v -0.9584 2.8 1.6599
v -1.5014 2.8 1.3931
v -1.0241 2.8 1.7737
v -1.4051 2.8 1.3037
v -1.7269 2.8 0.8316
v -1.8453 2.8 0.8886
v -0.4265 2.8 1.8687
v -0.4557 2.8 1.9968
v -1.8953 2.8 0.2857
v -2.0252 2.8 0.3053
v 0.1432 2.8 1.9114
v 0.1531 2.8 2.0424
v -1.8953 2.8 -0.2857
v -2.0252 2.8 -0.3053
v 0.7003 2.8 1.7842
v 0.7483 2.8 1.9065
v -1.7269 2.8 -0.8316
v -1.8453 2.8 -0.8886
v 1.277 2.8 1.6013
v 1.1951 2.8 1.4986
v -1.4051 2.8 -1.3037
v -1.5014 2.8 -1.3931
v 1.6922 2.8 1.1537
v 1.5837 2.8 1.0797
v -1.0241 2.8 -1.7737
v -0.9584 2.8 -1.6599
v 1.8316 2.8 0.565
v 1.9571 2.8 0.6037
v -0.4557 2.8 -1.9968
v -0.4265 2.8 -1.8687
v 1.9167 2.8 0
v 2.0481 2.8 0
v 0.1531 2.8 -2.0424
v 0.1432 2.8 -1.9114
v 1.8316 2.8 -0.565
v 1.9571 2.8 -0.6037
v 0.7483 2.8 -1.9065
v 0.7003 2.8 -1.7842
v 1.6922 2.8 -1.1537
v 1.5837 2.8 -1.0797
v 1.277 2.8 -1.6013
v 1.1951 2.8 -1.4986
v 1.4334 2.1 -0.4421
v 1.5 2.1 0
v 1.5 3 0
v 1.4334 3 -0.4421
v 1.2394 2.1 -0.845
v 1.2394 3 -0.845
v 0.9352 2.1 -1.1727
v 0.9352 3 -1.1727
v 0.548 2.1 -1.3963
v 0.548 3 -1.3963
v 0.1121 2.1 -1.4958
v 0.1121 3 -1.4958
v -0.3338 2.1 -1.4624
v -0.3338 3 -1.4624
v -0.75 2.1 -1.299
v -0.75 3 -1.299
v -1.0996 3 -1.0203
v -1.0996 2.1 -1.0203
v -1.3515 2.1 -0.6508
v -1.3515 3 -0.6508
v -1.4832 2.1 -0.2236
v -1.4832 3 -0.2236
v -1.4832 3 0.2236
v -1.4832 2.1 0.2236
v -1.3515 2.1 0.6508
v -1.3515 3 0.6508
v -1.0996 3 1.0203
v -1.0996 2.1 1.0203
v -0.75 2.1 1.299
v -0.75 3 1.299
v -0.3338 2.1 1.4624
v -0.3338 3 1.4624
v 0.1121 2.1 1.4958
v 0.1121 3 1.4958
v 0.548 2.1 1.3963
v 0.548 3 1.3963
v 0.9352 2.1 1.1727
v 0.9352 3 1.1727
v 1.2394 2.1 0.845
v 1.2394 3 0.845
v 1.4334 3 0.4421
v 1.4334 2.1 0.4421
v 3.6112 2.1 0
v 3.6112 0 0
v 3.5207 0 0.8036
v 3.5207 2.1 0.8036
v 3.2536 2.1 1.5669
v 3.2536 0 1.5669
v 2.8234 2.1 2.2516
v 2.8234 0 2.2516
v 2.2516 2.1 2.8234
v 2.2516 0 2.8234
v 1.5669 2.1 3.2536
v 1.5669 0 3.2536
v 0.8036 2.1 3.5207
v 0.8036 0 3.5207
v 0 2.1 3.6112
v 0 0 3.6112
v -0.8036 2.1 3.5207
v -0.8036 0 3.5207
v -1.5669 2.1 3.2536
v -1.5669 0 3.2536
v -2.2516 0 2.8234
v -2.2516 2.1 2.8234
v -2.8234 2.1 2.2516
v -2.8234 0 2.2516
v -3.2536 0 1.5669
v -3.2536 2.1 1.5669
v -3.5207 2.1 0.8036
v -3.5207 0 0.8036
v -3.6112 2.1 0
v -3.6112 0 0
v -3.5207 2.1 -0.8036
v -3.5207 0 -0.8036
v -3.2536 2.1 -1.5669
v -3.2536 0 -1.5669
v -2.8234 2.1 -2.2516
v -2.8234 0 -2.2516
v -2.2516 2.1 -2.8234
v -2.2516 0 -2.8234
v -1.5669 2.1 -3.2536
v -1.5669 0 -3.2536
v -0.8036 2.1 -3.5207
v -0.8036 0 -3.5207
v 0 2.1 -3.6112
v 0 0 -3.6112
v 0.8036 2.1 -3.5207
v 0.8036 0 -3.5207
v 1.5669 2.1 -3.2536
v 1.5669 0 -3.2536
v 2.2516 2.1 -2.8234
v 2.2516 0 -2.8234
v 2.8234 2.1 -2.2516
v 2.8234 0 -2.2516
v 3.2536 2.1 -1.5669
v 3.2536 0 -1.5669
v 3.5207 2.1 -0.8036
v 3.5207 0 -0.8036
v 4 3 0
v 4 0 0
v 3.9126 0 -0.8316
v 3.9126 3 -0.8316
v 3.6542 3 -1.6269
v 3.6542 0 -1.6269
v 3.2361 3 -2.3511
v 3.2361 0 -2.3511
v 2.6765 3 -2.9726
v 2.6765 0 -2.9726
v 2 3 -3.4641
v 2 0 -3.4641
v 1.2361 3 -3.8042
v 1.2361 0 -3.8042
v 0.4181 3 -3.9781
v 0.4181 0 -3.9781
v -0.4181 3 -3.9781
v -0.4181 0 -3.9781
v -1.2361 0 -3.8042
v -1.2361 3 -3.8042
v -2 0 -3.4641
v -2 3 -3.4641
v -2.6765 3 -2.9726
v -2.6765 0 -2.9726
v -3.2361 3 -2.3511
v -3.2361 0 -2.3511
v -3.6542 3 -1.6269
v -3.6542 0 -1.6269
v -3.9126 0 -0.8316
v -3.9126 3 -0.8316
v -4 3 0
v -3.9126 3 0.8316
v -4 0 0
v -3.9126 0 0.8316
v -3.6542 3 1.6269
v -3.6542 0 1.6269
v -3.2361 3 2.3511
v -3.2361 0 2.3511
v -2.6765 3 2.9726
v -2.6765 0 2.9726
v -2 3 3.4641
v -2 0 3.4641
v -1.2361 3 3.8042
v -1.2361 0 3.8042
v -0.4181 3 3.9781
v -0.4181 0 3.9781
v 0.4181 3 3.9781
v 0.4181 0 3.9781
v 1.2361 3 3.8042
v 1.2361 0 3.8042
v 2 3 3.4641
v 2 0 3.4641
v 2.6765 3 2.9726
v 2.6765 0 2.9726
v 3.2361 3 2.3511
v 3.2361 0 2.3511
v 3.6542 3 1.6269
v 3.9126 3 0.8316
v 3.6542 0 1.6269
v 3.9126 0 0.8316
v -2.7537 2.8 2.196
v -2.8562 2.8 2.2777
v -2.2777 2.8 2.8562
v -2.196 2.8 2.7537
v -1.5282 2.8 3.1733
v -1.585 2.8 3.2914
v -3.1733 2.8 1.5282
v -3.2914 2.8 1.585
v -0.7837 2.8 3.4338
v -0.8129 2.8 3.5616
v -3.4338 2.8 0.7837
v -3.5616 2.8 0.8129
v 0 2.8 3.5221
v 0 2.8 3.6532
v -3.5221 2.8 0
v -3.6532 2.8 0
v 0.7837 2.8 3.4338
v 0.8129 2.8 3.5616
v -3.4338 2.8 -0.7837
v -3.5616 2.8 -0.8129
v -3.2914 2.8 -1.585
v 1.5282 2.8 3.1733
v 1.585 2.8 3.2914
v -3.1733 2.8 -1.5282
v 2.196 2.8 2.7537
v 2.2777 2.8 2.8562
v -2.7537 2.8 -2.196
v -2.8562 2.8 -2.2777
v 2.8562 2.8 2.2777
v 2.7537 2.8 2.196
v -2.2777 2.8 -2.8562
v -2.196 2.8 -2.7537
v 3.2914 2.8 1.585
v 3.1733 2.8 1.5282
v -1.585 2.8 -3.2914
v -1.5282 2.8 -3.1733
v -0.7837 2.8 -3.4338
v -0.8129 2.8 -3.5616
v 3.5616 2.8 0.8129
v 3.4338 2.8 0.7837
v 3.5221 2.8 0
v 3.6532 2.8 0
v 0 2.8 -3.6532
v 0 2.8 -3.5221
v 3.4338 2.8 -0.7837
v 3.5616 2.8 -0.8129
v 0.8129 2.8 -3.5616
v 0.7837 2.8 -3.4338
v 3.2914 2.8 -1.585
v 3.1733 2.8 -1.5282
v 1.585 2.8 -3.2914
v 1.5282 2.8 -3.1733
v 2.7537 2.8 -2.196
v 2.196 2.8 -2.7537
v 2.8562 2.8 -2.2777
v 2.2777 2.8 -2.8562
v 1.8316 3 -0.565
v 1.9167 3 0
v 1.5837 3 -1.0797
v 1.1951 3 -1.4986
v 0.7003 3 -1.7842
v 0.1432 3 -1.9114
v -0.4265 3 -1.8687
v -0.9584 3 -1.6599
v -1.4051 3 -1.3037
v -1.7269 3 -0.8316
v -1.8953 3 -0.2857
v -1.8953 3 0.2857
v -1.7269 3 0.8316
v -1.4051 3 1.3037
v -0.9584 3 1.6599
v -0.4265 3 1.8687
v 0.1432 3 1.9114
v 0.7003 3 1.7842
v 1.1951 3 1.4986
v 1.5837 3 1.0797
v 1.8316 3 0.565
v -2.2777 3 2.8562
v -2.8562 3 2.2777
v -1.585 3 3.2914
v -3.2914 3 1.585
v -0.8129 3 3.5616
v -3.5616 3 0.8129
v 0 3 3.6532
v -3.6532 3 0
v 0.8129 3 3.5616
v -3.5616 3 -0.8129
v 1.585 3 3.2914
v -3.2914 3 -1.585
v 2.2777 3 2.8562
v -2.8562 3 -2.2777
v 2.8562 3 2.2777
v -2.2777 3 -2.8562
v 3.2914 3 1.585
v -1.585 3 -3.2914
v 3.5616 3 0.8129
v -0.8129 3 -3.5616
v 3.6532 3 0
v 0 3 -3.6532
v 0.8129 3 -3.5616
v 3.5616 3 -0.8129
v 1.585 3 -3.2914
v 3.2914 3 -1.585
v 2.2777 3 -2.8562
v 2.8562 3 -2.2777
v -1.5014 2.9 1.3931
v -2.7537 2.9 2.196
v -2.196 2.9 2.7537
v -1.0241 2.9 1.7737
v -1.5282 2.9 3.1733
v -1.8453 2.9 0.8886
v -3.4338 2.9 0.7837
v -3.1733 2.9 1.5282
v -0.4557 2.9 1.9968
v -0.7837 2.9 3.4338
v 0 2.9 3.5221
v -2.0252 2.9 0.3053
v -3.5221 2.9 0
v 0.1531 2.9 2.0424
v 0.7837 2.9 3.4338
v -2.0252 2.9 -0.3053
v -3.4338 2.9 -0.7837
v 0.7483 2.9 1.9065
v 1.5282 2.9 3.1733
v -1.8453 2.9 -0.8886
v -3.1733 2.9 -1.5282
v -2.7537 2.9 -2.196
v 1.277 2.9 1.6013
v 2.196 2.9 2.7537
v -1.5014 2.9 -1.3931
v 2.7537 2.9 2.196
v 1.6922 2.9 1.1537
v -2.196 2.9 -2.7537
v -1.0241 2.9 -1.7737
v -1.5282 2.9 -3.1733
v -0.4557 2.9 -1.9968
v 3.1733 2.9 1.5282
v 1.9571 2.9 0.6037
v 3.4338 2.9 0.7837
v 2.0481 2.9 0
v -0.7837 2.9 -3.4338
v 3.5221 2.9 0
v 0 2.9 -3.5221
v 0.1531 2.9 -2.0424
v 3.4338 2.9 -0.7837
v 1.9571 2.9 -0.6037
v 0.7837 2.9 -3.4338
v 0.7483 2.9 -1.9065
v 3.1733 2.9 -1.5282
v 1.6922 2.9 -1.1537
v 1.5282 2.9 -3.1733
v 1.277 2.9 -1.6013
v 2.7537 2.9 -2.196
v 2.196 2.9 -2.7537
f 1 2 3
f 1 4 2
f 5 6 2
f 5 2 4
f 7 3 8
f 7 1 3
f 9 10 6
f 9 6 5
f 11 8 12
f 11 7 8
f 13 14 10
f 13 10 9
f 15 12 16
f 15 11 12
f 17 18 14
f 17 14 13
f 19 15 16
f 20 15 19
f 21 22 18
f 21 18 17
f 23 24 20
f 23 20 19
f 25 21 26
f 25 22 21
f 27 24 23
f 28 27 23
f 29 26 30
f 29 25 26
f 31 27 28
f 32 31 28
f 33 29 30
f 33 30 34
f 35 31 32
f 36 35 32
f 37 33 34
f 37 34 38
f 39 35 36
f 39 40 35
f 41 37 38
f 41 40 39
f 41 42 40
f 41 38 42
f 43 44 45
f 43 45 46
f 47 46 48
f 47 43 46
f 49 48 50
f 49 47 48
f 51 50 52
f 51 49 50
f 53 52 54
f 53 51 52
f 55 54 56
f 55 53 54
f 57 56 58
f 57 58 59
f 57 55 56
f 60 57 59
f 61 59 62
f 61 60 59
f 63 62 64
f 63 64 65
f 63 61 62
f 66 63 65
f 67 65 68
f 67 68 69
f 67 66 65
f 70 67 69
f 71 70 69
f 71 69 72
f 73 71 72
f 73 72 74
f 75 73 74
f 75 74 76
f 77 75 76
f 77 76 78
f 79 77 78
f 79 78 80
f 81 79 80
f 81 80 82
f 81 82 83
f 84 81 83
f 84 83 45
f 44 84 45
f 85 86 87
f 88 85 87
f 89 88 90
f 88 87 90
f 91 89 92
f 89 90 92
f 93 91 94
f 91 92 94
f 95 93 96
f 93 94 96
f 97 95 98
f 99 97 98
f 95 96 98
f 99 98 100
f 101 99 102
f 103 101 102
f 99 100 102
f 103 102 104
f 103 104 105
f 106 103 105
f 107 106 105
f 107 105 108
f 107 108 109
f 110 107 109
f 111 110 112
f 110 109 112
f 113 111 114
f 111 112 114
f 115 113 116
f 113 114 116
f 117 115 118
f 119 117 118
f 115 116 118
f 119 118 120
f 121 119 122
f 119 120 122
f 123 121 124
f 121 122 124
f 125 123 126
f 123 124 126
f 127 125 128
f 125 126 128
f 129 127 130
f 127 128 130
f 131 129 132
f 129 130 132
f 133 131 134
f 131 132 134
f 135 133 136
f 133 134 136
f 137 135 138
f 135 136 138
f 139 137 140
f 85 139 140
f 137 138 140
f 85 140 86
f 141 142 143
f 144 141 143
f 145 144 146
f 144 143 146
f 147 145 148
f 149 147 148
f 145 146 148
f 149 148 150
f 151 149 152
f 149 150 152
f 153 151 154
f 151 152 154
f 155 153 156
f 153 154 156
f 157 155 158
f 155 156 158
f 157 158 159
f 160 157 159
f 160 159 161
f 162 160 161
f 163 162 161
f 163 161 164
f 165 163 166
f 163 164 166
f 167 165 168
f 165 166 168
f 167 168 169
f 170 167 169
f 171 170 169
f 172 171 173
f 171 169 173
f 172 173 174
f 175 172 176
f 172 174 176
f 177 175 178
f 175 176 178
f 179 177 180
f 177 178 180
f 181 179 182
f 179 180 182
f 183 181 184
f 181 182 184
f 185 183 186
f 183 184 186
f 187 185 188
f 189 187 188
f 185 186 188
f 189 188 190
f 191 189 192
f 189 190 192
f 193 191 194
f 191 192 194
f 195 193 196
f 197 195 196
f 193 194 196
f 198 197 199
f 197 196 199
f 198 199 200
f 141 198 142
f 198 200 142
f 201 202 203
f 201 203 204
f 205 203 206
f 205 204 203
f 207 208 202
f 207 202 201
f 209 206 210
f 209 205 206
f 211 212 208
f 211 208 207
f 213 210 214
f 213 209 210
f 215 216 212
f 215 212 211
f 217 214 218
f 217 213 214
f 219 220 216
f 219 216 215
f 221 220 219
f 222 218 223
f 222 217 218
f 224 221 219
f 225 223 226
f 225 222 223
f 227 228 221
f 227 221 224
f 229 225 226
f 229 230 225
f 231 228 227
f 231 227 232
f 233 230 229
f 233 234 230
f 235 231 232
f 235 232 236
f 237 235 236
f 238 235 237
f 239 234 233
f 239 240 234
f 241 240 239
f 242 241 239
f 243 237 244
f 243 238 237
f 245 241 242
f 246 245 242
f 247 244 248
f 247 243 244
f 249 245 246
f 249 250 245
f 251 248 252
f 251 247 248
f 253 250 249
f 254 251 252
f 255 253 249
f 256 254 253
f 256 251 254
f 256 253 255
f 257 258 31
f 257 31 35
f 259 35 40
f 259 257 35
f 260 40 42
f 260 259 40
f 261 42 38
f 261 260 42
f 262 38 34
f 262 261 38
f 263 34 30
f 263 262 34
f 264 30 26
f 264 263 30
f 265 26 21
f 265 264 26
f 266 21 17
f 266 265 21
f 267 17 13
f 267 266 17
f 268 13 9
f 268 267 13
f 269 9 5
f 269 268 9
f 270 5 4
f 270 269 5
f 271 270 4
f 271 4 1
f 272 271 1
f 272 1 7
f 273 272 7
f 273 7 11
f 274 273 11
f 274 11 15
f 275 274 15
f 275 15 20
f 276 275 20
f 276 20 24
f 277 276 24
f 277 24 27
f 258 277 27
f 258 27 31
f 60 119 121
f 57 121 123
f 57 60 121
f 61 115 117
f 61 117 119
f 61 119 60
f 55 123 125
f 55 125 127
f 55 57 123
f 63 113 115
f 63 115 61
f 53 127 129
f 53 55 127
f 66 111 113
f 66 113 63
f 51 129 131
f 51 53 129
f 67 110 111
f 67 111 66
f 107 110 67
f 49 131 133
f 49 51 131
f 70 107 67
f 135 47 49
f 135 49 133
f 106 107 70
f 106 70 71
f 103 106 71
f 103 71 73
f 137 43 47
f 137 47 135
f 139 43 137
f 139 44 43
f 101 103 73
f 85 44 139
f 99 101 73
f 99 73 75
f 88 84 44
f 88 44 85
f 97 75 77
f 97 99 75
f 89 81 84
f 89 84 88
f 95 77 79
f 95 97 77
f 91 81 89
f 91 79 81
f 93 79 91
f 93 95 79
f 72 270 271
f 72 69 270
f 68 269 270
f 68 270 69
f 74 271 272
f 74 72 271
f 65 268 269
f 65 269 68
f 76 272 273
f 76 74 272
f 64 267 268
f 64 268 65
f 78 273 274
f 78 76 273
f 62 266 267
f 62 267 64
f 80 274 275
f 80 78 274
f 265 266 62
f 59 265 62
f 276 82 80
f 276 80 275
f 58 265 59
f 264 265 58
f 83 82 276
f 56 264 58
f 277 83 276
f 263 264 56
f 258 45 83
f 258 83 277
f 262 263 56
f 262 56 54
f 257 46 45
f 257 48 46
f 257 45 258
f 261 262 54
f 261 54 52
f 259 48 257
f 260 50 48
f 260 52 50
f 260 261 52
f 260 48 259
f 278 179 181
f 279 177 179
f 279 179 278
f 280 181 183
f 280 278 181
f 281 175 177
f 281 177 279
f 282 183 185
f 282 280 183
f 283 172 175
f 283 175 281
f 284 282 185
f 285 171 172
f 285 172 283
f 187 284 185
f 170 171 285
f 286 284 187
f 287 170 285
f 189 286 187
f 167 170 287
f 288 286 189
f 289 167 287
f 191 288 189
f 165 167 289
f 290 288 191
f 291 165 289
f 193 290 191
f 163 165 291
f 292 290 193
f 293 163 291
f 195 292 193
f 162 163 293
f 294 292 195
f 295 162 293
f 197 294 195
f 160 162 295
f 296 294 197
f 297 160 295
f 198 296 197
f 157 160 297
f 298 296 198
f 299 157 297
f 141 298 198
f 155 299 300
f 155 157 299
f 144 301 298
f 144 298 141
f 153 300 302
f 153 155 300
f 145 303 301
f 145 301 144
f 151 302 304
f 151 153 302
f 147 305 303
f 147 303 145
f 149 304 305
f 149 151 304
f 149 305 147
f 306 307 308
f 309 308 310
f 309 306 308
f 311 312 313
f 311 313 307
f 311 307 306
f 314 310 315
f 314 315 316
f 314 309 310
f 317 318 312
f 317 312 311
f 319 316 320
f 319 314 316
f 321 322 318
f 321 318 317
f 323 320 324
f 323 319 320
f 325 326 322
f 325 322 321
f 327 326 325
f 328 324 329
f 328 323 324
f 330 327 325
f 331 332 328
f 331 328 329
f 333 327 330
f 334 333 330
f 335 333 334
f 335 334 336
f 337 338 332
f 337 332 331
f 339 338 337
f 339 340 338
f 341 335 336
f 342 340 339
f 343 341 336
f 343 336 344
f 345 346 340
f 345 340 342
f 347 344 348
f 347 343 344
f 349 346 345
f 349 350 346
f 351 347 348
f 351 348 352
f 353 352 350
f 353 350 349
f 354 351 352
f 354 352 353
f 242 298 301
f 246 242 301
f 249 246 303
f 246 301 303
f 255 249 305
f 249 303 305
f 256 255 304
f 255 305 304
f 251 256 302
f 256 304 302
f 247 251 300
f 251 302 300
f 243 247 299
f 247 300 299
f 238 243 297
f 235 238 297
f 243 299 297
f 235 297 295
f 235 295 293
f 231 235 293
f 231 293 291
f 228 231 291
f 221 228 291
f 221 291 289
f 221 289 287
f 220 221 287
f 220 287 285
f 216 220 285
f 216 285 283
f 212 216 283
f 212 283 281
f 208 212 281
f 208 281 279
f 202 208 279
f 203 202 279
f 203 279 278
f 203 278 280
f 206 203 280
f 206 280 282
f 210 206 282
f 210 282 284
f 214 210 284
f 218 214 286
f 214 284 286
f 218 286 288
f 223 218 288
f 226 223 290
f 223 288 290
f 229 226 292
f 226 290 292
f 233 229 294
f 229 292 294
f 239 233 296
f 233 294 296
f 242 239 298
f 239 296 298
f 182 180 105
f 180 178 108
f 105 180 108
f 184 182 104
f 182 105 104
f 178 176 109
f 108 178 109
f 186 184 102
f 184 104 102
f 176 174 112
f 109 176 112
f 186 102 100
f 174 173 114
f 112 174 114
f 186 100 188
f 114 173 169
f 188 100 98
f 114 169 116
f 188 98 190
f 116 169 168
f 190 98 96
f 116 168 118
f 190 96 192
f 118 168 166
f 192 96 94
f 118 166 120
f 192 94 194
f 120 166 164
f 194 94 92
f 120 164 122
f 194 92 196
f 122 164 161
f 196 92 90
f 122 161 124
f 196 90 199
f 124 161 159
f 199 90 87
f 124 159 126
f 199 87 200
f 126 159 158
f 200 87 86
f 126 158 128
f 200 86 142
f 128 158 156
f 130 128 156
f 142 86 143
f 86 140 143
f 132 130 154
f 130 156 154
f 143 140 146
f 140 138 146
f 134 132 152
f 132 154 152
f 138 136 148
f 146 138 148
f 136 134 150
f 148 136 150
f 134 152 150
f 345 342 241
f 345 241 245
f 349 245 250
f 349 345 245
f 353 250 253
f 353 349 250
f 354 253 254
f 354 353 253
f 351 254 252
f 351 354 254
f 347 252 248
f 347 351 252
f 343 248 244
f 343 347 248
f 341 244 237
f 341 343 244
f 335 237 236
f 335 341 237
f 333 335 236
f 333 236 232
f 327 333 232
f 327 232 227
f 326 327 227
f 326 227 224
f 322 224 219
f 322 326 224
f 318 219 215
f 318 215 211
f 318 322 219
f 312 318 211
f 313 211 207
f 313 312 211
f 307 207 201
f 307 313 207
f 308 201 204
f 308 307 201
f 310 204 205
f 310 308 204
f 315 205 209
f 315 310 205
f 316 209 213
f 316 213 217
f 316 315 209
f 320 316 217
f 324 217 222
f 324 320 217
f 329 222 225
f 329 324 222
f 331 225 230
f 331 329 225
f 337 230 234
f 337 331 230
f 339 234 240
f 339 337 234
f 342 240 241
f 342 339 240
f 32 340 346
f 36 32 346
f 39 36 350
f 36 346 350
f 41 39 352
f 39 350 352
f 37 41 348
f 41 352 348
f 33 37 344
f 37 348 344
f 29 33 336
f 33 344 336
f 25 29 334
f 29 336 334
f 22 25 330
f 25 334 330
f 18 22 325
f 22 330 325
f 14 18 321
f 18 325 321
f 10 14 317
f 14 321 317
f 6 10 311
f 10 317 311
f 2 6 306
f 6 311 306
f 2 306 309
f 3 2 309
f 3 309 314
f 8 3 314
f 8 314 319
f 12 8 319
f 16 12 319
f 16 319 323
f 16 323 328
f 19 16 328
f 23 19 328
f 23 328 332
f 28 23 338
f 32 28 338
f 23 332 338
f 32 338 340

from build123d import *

# Parameters (mm, degrees)
SKETCH1_R           = 4
SKETCH1_R_2         = 1.5
BOSS_EXTRUDE1_DEPTH = 3
SKETCH2_R           = 3.653156204
SKETCH2_R_2         = 1.91674474
CUT_EXTRUDE1_DEPTH  = 0.1
SKETCH4_R           = 2.048114098
SKETCH4_R_2         = 1.91674474
CUT_EXTRUDE6_DEPTH  = 0.1
SKETCH5_R           = 3.653156204
SKETCH5_R_2         = 3.522114118
CUT_EXTRUDE7_DEPTH  = 0.1
SKETCH6_R           = 3.611227951
CUT_EXTRUDE8_DEPTH  = 2.1


with BuildPart() as part:
    # Sketch1 → Boss-Extrude1 (new body)
    with BuildSketch(Plane(origin=(0, 0, 0), x_dir=(1, 0, 0), z_dir=(0, 1, 0))):
        Circle(SKETCH1_R)
        Circle(SKETCH1_R_2, mode=Mode.SUBTRACT)
    extrude(amount=BOSS_EXTRUDE1_DEPTH)

    # Sketch2 → Cut-Extrude1 (cut)
    with BuildSketch(Plane(origin=(0, 3, 0), x_dir=(1, 0, 0), z_dir=(0, 1, 0))):
        Circle(SKETCH2_R)
        Circle(SKETCH2_R_2, mode=Mode.SUBTRACT)
    extrude(amount=-CUT_EXTRUDE1_DEPTH, mode=Mode.SUBTRACT)

    # Sketch4 → Cut-Extrude6 (cut)
    with BuildSketch(Plane(origin=(0, 2.9, 0), x_dir=(1, 0, 0), z_dir=(0, 1, 0))):
        Circle(SKETCH4_R)
        Circle(SKETCH4_R_2, mode=Mode.SUBTRACT)
    extrude(amount=-CUT_EXTRUDE6_DEPTH, mode=Mode.SUBTRACT)

    # Sketch5 → Cut-Extrude7 (cut)
    with BuildSketch(Plane(origin=(0, 2.9, 0), x_dir=(1, 0, 0), z_dir=(0, 1, 0))):
        Circle(SKETCH5_R)
        Circle(SKETCH5_R_2, mode=Mode.SUBTRACT)
    extrude(amount=-CUT_EXTRUDE7_DEPTH, mode=Mode.SUBTRACT)

    # Sketch6 → Cut-Extrude8 (cut)
    with BuildSketch(Plane.XZ):
        Circle(SKETCH6_R)
    extrude(amount=-CUT_EXTRUDE8_DEPTH, mode=Mode.SUBTRACT)


solid = part.part
